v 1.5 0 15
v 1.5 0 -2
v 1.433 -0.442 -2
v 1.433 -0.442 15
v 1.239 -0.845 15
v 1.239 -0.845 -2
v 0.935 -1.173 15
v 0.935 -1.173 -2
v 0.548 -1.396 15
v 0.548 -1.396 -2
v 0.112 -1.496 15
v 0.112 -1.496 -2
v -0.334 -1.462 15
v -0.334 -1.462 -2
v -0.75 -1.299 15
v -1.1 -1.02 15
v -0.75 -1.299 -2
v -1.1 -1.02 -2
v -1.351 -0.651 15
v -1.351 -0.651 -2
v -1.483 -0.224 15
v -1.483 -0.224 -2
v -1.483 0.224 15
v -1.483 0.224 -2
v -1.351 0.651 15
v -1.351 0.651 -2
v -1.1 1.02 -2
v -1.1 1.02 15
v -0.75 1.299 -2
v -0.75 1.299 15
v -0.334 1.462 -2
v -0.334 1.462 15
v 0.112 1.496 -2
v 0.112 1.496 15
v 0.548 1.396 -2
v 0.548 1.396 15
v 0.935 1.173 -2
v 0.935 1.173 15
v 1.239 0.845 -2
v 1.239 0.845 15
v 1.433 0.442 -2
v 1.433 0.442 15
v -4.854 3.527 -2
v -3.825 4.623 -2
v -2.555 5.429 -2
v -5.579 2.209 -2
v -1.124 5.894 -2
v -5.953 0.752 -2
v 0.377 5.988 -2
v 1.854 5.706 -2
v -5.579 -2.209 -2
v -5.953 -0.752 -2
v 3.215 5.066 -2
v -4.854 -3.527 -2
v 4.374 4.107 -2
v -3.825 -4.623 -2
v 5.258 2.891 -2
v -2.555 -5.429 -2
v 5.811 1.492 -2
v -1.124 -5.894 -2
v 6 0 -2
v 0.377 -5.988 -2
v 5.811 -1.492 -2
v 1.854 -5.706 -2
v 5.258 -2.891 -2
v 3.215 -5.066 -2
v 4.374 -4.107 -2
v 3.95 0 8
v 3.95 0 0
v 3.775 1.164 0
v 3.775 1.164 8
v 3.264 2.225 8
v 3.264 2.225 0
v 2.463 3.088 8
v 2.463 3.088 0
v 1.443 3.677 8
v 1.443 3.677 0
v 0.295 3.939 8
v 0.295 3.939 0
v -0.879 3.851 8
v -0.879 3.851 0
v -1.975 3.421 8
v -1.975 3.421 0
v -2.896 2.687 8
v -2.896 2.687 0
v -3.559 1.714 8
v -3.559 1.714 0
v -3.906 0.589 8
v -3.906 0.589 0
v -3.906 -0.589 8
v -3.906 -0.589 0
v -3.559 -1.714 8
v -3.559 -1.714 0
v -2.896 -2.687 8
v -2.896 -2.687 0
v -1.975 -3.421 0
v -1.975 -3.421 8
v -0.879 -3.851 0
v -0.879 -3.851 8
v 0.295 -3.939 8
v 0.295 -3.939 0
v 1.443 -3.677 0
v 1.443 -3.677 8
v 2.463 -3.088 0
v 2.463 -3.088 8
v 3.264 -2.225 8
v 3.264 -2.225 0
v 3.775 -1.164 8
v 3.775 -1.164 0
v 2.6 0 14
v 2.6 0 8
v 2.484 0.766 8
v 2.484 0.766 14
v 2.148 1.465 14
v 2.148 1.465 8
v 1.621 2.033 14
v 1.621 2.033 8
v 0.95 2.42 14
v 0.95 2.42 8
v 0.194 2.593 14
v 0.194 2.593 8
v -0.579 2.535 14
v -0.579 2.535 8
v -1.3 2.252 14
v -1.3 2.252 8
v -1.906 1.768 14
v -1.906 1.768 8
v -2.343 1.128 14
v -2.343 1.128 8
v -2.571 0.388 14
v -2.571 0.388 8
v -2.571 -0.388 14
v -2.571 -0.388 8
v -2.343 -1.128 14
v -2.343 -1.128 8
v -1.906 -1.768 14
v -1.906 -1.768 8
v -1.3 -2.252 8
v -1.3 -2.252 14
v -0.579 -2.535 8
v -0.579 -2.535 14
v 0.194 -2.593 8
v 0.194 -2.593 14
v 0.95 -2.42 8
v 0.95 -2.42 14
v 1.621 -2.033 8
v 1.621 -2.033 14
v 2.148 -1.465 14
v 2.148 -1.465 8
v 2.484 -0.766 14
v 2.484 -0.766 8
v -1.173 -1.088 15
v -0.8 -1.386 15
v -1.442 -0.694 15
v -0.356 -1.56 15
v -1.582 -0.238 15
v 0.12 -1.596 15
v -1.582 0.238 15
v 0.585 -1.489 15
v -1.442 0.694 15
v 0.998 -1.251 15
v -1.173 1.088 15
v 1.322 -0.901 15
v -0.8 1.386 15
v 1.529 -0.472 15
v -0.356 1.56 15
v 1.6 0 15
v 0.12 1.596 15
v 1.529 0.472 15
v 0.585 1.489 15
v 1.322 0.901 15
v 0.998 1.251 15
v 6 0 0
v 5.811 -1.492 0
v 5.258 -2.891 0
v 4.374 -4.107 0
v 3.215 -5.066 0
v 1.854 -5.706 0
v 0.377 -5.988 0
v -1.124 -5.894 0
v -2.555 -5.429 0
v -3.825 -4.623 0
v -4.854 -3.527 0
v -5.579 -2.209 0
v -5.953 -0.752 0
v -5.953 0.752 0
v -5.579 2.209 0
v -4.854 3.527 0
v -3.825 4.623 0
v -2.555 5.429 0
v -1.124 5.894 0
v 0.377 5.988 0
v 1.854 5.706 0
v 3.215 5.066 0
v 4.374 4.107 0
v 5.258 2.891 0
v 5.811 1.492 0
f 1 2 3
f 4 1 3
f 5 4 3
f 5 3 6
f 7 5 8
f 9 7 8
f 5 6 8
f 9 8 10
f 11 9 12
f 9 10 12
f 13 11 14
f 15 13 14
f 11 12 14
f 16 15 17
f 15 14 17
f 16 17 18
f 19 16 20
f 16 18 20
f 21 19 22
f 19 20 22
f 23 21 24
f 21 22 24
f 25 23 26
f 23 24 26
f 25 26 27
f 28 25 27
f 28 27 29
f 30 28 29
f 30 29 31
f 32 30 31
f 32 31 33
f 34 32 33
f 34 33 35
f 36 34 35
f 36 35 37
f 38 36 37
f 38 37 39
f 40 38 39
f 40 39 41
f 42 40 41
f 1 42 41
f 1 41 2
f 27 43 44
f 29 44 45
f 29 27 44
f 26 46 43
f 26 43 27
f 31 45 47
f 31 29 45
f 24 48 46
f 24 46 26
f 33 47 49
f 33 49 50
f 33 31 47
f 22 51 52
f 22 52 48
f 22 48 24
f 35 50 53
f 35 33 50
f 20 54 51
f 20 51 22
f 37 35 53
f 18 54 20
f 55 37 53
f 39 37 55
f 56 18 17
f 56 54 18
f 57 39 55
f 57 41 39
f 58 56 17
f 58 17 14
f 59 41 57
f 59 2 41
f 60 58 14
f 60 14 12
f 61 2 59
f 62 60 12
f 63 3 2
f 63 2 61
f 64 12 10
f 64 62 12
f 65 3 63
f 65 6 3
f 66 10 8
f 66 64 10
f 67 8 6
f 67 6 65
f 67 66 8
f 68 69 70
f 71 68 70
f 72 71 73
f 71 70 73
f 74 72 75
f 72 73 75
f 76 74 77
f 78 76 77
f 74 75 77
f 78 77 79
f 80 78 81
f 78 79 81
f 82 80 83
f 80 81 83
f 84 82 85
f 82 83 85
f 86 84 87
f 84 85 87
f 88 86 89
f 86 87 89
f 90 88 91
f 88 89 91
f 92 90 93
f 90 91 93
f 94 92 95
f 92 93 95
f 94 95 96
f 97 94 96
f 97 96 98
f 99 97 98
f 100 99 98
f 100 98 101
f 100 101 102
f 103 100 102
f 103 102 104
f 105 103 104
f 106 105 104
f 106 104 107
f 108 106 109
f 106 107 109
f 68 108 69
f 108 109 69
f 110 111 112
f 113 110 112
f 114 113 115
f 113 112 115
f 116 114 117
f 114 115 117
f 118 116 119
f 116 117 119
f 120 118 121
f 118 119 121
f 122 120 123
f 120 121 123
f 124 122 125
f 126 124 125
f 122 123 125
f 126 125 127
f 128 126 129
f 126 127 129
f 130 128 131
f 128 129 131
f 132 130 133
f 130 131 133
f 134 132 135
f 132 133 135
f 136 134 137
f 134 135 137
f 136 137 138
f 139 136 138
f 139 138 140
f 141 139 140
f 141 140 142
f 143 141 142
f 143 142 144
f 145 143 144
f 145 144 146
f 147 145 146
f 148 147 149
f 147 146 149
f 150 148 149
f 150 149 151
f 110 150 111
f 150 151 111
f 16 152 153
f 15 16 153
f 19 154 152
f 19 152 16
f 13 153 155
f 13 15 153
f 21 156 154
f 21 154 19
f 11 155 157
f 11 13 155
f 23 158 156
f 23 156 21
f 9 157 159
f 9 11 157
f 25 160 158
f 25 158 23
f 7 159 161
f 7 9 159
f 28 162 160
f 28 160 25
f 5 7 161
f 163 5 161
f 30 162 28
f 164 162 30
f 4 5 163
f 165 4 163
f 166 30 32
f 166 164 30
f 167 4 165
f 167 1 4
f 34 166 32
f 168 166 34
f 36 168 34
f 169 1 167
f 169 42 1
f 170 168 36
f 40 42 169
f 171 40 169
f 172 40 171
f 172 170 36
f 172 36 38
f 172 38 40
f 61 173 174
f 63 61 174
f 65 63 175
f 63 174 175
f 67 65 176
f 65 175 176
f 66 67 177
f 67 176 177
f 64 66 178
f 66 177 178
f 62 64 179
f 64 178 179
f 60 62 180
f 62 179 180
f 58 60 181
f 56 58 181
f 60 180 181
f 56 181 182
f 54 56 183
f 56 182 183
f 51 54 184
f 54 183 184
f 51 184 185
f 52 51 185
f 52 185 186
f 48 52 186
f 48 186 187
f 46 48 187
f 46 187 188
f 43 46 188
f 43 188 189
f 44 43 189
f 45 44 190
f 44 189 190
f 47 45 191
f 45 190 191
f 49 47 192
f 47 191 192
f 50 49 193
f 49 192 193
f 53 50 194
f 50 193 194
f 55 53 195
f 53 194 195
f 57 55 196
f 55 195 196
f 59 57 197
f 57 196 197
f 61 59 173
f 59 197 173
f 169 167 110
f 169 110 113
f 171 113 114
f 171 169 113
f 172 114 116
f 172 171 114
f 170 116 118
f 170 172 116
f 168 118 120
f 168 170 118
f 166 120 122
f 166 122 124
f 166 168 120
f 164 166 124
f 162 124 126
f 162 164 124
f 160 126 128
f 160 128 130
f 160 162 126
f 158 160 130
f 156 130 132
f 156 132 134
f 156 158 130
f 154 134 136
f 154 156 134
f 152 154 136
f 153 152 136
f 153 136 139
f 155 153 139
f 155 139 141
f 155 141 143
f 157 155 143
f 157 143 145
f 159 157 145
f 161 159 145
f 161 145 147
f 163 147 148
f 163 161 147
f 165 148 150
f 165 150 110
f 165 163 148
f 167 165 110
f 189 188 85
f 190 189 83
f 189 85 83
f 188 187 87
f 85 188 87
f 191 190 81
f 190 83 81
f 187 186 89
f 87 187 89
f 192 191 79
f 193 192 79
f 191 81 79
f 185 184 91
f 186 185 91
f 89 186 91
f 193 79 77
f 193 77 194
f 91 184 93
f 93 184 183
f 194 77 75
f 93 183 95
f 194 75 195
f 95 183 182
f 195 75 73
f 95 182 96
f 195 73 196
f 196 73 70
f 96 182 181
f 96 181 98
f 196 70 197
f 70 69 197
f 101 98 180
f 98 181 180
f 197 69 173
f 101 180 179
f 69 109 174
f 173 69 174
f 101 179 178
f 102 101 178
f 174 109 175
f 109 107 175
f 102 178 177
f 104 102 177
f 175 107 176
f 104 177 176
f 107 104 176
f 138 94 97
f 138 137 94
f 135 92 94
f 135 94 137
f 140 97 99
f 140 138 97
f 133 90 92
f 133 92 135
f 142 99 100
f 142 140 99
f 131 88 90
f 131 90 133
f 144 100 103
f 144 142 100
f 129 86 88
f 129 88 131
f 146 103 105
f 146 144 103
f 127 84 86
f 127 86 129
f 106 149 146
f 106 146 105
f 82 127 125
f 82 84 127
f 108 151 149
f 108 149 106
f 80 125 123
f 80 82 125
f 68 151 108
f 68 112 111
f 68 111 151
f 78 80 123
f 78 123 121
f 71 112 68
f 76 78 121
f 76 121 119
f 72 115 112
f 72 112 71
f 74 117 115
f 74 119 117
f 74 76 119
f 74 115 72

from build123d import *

# Parameters (mm, degrees)
F0_R     = 3.95
F1_DEPTH = 8
F2_R     = 2.6
F3_DEPTH = 7
F4_SIZE  = 1
F5_R     = 6
F6_DEPTH = 2
F7_R     = 1.5
F8_DEPTH = 17.001


with BuildPart() as f1:
    # F0 (on Top) → F1 (new body)
    with BuildSketch(Plane.XY):
        Circle(F0_R)
    extrude(amount=F1_DEPTH)

    # F2 (on face) → F3 (join)
    with BuildSketch(Plane.XY.offset(8)):
        Circle(F2_R)
    extrude(amount=F3_DEPTH)

    # F4
    f4_edges = [f1.edges().sort_by_distance(p)[0] for p in [
        (-2.6, 0, 15),
    ]]
    chamfer(f4_edges, length=F4_SIZE)

    # F5 (on face) → F6 (join)
    with BuildSketch(Plane(origin=(0, 0, 0), x_dir=(1, 0, 0), z_dir=(0, 0, -1))):
        Circle(F5_R)
    extrude(amount=F6_DEPTH)

    # F7 (on face) → F8 (cut, through all)
    with BuildSketch(Plane(origin=(0, 0, -2), x_dir=(1, 0, 0), z_dir=(0, 0, -1))):
        Circle(F7_R)
    extrude(amount=-F8_DEPTH, mode=Mode.SUBTRACT)


solid = f1.part
